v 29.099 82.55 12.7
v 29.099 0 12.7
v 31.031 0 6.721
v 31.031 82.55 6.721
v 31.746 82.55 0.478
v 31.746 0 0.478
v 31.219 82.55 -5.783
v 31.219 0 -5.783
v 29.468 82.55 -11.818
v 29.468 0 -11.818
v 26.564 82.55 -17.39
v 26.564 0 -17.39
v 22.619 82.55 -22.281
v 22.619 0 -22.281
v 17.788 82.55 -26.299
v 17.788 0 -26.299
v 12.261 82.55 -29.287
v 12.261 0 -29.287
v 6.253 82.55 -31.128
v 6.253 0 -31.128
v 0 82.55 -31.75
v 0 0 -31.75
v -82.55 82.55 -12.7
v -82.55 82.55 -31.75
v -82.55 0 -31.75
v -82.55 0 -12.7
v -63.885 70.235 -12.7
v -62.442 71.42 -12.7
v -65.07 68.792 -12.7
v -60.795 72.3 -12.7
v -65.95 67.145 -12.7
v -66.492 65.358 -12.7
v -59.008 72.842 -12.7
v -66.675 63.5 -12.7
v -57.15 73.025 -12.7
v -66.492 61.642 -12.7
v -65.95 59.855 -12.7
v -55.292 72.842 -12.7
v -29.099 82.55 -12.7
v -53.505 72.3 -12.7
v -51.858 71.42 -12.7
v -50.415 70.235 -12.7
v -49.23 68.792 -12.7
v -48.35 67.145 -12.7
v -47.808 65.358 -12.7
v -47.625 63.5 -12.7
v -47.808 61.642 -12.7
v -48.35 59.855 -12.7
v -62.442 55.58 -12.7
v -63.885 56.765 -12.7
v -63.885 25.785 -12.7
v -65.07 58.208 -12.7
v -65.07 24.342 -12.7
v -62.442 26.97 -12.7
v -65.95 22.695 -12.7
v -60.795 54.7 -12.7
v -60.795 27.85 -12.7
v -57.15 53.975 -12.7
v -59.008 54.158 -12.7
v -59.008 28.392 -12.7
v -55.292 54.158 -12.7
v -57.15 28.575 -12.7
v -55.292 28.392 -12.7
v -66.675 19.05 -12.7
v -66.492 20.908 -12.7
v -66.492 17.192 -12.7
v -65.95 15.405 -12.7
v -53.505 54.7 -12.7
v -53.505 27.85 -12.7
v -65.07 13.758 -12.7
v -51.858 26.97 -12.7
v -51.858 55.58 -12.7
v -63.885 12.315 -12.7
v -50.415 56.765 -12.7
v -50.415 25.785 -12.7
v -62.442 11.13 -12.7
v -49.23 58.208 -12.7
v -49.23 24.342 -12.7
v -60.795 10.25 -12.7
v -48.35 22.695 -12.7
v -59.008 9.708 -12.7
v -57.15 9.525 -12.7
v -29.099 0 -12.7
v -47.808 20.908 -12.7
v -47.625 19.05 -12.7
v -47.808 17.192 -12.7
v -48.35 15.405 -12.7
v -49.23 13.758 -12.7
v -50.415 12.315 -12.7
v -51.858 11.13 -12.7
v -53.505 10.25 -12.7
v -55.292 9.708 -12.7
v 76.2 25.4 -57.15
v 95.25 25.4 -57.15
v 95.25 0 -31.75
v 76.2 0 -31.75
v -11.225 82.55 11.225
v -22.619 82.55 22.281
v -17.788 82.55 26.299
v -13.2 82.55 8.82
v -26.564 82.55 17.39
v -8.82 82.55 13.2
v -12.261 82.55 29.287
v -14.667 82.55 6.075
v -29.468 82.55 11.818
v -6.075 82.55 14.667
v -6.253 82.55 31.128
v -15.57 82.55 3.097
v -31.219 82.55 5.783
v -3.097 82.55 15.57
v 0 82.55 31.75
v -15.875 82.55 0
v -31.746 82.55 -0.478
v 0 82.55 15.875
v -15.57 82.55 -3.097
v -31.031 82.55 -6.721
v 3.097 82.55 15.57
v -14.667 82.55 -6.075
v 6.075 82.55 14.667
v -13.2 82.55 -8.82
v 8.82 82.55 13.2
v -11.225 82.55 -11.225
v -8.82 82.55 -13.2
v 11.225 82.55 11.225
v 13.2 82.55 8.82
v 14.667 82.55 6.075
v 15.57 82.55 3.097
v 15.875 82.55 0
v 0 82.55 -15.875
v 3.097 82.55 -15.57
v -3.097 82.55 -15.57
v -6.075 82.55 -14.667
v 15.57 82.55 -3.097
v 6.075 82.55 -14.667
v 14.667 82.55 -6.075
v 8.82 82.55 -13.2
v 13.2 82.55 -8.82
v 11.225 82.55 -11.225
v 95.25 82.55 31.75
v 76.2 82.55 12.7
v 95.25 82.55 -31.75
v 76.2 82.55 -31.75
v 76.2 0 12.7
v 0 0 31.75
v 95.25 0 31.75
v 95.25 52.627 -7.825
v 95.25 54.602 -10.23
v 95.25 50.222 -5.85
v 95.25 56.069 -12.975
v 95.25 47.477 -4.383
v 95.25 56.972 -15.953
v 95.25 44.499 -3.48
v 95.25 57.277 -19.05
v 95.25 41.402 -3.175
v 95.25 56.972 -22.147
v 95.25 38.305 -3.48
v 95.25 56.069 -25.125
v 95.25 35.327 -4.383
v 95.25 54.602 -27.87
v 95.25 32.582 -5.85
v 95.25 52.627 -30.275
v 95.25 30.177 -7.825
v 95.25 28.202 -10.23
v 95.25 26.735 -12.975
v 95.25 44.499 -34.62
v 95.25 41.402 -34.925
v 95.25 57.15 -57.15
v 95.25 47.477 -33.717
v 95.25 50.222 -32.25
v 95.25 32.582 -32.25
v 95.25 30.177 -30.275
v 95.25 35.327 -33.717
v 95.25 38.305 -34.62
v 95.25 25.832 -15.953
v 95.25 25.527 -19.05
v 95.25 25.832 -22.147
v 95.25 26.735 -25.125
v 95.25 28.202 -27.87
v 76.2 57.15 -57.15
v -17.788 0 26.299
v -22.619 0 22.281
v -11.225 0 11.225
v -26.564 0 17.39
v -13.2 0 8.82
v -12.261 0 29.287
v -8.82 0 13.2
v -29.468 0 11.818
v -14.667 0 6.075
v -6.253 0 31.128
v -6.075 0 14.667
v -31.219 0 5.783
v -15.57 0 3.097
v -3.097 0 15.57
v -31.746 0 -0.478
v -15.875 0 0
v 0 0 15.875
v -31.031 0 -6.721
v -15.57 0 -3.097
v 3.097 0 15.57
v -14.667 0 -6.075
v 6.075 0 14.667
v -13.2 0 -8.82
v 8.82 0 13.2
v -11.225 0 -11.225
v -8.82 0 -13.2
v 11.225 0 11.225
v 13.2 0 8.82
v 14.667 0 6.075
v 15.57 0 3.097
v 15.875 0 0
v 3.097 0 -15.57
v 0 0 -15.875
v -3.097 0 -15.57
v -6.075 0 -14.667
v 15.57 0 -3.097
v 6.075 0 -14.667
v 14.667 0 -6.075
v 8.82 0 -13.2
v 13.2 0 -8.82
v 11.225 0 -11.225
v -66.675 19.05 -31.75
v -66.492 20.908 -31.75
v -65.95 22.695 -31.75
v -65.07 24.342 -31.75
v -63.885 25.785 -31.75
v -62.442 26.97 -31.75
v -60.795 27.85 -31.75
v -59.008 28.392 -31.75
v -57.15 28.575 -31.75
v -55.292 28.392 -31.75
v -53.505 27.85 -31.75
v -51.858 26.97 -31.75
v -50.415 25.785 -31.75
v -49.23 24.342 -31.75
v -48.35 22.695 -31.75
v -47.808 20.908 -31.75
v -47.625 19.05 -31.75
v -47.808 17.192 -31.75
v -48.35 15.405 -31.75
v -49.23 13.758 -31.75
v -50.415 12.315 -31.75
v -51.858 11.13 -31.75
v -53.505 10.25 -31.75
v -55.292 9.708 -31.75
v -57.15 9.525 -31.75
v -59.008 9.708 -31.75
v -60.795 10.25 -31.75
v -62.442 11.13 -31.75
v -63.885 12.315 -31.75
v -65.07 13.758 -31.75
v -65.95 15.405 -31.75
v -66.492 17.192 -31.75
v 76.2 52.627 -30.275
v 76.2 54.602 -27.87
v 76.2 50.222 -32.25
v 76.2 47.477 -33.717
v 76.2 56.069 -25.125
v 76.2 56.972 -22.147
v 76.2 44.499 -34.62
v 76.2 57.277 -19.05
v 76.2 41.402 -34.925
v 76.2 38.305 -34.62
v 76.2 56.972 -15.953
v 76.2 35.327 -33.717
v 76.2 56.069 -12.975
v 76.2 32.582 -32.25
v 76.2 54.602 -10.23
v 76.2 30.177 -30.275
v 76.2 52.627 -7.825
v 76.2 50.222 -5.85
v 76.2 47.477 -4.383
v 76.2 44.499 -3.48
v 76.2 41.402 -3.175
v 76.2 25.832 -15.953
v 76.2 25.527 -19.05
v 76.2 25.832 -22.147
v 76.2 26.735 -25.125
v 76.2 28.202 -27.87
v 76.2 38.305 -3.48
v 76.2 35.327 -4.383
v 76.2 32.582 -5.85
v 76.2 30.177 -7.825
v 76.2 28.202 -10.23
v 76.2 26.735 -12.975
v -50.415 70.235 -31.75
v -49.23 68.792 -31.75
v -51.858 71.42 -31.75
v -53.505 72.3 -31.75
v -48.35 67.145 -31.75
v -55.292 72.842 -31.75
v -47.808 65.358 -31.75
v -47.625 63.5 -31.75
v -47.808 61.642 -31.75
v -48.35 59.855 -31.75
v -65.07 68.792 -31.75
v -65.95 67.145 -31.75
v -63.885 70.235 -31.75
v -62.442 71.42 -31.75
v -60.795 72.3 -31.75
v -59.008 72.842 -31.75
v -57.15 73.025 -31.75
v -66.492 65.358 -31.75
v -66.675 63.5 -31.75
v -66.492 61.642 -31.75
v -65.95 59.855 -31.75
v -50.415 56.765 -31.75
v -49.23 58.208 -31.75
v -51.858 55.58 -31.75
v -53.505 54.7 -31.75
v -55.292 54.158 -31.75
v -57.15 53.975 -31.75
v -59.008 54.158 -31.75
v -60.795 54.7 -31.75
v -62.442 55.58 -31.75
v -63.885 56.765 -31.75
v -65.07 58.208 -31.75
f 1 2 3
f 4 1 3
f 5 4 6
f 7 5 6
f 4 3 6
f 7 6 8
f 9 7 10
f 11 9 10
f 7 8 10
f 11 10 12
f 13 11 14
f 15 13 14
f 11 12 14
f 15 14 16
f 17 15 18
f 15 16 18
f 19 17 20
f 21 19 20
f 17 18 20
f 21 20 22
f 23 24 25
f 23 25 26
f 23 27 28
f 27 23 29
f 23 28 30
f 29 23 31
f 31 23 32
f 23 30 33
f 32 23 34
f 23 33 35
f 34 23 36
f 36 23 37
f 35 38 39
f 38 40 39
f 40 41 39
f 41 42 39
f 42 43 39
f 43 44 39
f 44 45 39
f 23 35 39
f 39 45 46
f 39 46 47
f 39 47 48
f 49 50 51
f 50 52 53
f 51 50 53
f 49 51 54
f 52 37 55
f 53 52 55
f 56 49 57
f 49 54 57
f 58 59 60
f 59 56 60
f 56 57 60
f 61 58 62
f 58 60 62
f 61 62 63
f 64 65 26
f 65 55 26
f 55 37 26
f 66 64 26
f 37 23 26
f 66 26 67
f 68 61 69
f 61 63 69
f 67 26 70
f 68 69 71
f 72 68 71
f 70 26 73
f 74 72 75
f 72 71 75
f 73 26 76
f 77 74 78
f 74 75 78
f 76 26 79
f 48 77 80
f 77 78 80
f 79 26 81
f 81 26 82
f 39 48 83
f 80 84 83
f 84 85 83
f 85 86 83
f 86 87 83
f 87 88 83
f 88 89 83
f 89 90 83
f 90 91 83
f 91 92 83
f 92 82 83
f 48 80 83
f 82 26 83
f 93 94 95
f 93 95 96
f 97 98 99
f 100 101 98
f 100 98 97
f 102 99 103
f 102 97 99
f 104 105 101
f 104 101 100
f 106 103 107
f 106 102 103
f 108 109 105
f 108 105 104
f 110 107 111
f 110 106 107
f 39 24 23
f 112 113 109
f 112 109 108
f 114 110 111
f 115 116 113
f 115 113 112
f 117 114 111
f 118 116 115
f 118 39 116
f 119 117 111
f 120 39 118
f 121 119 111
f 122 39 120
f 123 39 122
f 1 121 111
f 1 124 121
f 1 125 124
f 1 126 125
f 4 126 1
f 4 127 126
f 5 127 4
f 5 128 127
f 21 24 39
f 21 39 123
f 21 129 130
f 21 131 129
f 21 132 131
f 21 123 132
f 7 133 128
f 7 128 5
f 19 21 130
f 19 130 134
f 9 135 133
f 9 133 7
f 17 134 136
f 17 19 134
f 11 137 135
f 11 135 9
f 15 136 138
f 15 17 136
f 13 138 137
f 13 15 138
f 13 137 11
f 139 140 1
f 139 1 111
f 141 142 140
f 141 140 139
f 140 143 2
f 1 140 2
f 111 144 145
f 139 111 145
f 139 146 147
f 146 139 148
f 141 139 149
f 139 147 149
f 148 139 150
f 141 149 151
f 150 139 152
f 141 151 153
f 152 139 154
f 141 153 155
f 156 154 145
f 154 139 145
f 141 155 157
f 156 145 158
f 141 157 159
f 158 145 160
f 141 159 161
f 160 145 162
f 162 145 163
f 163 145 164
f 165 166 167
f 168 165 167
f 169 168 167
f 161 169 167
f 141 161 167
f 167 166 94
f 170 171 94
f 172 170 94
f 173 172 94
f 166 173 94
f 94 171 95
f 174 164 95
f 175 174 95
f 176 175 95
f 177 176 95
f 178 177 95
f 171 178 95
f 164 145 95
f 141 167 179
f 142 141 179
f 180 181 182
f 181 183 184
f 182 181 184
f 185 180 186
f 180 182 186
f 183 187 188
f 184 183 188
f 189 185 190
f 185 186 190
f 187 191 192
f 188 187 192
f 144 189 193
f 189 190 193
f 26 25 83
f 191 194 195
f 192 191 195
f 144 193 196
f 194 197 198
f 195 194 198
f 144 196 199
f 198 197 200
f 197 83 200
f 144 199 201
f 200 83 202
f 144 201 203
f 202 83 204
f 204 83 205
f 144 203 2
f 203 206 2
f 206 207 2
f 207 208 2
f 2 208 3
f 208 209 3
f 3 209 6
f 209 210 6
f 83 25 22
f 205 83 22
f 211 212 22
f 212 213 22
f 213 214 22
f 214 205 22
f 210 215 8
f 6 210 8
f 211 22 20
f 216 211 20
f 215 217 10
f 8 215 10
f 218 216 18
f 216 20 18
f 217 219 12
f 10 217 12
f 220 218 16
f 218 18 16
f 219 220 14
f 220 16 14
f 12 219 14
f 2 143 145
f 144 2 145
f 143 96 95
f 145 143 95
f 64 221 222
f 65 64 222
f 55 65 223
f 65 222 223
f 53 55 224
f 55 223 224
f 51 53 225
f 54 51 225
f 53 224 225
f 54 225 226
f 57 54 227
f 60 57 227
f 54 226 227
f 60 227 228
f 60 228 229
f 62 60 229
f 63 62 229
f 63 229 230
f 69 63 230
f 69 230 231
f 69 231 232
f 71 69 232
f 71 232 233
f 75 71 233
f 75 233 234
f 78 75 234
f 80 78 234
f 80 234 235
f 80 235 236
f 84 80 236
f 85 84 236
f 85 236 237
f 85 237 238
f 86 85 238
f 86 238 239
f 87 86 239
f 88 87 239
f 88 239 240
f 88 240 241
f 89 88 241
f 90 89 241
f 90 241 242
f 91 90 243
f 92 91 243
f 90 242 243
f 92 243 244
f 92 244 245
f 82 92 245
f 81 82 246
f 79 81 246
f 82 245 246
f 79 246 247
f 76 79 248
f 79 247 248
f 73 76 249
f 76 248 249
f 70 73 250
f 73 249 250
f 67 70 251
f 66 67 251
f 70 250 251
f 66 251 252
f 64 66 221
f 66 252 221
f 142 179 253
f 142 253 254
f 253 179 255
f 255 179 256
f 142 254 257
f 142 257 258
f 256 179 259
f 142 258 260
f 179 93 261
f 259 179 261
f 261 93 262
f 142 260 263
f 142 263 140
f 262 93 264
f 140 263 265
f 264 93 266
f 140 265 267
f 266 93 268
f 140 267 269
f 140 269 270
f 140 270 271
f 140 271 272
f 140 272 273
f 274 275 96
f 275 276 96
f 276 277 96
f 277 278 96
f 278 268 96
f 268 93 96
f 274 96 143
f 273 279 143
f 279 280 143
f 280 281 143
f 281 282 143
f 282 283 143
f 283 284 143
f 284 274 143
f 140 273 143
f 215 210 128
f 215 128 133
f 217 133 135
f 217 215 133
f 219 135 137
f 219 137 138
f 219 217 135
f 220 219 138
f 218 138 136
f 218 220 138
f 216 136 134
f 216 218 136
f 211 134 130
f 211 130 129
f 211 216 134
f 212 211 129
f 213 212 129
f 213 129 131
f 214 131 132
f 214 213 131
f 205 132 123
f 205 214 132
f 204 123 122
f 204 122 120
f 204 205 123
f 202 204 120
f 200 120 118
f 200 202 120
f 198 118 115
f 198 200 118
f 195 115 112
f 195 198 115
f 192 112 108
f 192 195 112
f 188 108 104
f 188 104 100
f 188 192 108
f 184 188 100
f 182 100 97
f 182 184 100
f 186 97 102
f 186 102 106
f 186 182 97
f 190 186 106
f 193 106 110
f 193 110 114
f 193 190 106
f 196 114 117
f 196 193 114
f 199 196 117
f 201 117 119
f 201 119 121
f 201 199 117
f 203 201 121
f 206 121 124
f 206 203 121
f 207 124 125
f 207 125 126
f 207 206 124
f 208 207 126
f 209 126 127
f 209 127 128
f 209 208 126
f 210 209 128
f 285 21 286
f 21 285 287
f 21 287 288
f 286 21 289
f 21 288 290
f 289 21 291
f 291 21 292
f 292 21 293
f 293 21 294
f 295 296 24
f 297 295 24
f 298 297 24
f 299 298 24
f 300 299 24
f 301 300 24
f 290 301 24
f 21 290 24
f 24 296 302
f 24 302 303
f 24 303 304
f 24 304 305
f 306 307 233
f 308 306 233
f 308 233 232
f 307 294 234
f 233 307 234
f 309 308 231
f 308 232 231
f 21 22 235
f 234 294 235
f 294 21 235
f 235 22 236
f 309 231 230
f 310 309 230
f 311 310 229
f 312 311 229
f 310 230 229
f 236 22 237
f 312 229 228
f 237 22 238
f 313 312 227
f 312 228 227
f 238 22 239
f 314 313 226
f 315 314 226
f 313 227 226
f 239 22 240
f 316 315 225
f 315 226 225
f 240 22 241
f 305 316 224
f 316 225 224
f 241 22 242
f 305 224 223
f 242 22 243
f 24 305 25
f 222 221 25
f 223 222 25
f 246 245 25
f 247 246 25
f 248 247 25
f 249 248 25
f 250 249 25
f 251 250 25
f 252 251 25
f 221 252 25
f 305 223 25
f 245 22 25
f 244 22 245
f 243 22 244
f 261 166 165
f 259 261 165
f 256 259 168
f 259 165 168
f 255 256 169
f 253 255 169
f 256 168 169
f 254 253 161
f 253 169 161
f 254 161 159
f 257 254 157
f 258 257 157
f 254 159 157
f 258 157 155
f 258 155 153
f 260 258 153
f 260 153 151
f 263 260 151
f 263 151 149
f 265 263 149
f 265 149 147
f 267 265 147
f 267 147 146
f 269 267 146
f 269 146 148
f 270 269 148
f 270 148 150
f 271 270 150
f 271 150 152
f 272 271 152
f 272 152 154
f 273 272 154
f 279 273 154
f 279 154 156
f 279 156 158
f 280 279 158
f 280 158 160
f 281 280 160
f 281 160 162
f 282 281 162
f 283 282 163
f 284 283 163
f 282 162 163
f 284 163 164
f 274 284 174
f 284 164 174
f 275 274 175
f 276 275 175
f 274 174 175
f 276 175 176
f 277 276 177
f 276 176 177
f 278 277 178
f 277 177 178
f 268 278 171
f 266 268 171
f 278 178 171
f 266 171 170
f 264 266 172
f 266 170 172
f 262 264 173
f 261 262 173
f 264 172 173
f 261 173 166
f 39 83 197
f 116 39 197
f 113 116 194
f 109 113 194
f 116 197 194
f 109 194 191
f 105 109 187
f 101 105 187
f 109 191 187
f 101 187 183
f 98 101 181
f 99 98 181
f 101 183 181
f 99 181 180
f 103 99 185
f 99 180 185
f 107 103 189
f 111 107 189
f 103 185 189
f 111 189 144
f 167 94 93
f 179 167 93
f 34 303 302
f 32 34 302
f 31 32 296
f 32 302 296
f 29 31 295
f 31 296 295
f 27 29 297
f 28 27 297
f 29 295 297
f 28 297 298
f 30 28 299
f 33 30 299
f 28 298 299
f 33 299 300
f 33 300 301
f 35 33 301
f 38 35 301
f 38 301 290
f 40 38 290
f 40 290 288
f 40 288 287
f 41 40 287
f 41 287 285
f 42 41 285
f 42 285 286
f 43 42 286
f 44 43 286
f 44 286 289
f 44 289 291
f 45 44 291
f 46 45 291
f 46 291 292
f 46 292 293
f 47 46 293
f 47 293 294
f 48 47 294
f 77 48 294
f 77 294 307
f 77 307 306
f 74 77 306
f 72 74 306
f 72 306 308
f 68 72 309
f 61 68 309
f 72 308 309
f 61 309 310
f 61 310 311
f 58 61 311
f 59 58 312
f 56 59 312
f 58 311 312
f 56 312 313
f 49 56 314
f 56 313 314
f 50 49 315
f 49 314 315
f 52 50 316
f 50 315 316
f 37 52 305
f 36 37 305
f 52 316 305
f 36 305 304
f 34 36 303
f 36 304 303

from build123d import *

# Parameters (mm, degrees)
SKETCH1_R           = 15.875
BOSS_EXTRUDE1_DEPTH = 82.55
SKETCH2_R           = 15.875
CUT_EXTRUDE1_DEPTH  = 41.402
SKETCH3_R           = 9.525
CUT_EXTRUDE2_DEPTH  = 41.402
CHAMFER1_SIZE       = 25.4
CHAMFER2_SIZE       = 25.4


with BuildPart() as part:
    # Sketch1 → Boss-Extrude1 (new body)
    with BuildSketch(Plane(origin=(0, 0, 0), x_dir=(1, 0, 0), z_dir=(0, 1, 0))):
        with BuildLine():
            Line((0, 31.75), (-82.55, 31.75))
            Line((-82.55, 31.75), (-82.55, 12.7))
            Line((-82.55, 12.7), (-29.099355663, 12.7))
            ThreePointArc((-29.099355663, 12.7), (-26.563955842, -17.390191201), (0, -31.75))
            Line((0, -31.75), (95.25, -31.75))
            Line((95.25, -31.75), (95.25, 57.15))
            Line((95.25, 57.15), (76.2, 57.15))
            Line((76.2, 57.15), (76.2, -12.7))
            Line((76.2, -12.7), (29.099355663, -12.7))
            ThreePointArc((29.099355663, -12.7), (26.563955842, 17.390191201), (0, 31.75))
        make_face()
        Circle(SKETCH1_R, mode=Mode.SUBTRACT)
    extrude(amount=BOSS_EXTRUDE1_DEPTH)

    # Sketch2 → Cut-Extrude1 (cut)
    with BuildSketch(Plane(origin=(95.25, 0, 0), x_dir=(0, 0, -1), z_dir=(1, 0, 0))):
        with Locations((19.05, 41.402)):
            Circle(SKETCH2_R)
    extrude(amount=-CUT_EXTRUDE1_DEPTH, mode=Mode.SUBTRACT)

    # Sketch3 → Cut-Extrude2 (cut)
    with BuildSketch(Plane(origin=(0, 0, -31.75), x_dir=(-1, 0, 0), z_dir=(0, 0, -1))):
        with Locations((57.15, 63.5)):
            Circle(SKETCH3_R)
        with Locations((57.15, 19.05)):
            Circle(SKETCH3_R)
    extrude(amount=-CUT_EXTRUDE2_DEPTH, mode=Mode.SUBTRACT)

    # Chamfer1
    chamfer1_edges = [part.edges().sort_by_distance(p)[0] for p in [
        (85.725, 82.55, -57.15),
    ]]
    chamfer(chamfer1_edges, length=CHAMFER1_SIZE)

    # Chamfer2
    chamfer2_edges = [part.edges().sort_by_distance(p)[0] for p in [
        (85.725, 0, -57.15),
    ]]
    chamfer(chamfer2_edges, length=CHAMFER2_SIZE)


solid = part.part
